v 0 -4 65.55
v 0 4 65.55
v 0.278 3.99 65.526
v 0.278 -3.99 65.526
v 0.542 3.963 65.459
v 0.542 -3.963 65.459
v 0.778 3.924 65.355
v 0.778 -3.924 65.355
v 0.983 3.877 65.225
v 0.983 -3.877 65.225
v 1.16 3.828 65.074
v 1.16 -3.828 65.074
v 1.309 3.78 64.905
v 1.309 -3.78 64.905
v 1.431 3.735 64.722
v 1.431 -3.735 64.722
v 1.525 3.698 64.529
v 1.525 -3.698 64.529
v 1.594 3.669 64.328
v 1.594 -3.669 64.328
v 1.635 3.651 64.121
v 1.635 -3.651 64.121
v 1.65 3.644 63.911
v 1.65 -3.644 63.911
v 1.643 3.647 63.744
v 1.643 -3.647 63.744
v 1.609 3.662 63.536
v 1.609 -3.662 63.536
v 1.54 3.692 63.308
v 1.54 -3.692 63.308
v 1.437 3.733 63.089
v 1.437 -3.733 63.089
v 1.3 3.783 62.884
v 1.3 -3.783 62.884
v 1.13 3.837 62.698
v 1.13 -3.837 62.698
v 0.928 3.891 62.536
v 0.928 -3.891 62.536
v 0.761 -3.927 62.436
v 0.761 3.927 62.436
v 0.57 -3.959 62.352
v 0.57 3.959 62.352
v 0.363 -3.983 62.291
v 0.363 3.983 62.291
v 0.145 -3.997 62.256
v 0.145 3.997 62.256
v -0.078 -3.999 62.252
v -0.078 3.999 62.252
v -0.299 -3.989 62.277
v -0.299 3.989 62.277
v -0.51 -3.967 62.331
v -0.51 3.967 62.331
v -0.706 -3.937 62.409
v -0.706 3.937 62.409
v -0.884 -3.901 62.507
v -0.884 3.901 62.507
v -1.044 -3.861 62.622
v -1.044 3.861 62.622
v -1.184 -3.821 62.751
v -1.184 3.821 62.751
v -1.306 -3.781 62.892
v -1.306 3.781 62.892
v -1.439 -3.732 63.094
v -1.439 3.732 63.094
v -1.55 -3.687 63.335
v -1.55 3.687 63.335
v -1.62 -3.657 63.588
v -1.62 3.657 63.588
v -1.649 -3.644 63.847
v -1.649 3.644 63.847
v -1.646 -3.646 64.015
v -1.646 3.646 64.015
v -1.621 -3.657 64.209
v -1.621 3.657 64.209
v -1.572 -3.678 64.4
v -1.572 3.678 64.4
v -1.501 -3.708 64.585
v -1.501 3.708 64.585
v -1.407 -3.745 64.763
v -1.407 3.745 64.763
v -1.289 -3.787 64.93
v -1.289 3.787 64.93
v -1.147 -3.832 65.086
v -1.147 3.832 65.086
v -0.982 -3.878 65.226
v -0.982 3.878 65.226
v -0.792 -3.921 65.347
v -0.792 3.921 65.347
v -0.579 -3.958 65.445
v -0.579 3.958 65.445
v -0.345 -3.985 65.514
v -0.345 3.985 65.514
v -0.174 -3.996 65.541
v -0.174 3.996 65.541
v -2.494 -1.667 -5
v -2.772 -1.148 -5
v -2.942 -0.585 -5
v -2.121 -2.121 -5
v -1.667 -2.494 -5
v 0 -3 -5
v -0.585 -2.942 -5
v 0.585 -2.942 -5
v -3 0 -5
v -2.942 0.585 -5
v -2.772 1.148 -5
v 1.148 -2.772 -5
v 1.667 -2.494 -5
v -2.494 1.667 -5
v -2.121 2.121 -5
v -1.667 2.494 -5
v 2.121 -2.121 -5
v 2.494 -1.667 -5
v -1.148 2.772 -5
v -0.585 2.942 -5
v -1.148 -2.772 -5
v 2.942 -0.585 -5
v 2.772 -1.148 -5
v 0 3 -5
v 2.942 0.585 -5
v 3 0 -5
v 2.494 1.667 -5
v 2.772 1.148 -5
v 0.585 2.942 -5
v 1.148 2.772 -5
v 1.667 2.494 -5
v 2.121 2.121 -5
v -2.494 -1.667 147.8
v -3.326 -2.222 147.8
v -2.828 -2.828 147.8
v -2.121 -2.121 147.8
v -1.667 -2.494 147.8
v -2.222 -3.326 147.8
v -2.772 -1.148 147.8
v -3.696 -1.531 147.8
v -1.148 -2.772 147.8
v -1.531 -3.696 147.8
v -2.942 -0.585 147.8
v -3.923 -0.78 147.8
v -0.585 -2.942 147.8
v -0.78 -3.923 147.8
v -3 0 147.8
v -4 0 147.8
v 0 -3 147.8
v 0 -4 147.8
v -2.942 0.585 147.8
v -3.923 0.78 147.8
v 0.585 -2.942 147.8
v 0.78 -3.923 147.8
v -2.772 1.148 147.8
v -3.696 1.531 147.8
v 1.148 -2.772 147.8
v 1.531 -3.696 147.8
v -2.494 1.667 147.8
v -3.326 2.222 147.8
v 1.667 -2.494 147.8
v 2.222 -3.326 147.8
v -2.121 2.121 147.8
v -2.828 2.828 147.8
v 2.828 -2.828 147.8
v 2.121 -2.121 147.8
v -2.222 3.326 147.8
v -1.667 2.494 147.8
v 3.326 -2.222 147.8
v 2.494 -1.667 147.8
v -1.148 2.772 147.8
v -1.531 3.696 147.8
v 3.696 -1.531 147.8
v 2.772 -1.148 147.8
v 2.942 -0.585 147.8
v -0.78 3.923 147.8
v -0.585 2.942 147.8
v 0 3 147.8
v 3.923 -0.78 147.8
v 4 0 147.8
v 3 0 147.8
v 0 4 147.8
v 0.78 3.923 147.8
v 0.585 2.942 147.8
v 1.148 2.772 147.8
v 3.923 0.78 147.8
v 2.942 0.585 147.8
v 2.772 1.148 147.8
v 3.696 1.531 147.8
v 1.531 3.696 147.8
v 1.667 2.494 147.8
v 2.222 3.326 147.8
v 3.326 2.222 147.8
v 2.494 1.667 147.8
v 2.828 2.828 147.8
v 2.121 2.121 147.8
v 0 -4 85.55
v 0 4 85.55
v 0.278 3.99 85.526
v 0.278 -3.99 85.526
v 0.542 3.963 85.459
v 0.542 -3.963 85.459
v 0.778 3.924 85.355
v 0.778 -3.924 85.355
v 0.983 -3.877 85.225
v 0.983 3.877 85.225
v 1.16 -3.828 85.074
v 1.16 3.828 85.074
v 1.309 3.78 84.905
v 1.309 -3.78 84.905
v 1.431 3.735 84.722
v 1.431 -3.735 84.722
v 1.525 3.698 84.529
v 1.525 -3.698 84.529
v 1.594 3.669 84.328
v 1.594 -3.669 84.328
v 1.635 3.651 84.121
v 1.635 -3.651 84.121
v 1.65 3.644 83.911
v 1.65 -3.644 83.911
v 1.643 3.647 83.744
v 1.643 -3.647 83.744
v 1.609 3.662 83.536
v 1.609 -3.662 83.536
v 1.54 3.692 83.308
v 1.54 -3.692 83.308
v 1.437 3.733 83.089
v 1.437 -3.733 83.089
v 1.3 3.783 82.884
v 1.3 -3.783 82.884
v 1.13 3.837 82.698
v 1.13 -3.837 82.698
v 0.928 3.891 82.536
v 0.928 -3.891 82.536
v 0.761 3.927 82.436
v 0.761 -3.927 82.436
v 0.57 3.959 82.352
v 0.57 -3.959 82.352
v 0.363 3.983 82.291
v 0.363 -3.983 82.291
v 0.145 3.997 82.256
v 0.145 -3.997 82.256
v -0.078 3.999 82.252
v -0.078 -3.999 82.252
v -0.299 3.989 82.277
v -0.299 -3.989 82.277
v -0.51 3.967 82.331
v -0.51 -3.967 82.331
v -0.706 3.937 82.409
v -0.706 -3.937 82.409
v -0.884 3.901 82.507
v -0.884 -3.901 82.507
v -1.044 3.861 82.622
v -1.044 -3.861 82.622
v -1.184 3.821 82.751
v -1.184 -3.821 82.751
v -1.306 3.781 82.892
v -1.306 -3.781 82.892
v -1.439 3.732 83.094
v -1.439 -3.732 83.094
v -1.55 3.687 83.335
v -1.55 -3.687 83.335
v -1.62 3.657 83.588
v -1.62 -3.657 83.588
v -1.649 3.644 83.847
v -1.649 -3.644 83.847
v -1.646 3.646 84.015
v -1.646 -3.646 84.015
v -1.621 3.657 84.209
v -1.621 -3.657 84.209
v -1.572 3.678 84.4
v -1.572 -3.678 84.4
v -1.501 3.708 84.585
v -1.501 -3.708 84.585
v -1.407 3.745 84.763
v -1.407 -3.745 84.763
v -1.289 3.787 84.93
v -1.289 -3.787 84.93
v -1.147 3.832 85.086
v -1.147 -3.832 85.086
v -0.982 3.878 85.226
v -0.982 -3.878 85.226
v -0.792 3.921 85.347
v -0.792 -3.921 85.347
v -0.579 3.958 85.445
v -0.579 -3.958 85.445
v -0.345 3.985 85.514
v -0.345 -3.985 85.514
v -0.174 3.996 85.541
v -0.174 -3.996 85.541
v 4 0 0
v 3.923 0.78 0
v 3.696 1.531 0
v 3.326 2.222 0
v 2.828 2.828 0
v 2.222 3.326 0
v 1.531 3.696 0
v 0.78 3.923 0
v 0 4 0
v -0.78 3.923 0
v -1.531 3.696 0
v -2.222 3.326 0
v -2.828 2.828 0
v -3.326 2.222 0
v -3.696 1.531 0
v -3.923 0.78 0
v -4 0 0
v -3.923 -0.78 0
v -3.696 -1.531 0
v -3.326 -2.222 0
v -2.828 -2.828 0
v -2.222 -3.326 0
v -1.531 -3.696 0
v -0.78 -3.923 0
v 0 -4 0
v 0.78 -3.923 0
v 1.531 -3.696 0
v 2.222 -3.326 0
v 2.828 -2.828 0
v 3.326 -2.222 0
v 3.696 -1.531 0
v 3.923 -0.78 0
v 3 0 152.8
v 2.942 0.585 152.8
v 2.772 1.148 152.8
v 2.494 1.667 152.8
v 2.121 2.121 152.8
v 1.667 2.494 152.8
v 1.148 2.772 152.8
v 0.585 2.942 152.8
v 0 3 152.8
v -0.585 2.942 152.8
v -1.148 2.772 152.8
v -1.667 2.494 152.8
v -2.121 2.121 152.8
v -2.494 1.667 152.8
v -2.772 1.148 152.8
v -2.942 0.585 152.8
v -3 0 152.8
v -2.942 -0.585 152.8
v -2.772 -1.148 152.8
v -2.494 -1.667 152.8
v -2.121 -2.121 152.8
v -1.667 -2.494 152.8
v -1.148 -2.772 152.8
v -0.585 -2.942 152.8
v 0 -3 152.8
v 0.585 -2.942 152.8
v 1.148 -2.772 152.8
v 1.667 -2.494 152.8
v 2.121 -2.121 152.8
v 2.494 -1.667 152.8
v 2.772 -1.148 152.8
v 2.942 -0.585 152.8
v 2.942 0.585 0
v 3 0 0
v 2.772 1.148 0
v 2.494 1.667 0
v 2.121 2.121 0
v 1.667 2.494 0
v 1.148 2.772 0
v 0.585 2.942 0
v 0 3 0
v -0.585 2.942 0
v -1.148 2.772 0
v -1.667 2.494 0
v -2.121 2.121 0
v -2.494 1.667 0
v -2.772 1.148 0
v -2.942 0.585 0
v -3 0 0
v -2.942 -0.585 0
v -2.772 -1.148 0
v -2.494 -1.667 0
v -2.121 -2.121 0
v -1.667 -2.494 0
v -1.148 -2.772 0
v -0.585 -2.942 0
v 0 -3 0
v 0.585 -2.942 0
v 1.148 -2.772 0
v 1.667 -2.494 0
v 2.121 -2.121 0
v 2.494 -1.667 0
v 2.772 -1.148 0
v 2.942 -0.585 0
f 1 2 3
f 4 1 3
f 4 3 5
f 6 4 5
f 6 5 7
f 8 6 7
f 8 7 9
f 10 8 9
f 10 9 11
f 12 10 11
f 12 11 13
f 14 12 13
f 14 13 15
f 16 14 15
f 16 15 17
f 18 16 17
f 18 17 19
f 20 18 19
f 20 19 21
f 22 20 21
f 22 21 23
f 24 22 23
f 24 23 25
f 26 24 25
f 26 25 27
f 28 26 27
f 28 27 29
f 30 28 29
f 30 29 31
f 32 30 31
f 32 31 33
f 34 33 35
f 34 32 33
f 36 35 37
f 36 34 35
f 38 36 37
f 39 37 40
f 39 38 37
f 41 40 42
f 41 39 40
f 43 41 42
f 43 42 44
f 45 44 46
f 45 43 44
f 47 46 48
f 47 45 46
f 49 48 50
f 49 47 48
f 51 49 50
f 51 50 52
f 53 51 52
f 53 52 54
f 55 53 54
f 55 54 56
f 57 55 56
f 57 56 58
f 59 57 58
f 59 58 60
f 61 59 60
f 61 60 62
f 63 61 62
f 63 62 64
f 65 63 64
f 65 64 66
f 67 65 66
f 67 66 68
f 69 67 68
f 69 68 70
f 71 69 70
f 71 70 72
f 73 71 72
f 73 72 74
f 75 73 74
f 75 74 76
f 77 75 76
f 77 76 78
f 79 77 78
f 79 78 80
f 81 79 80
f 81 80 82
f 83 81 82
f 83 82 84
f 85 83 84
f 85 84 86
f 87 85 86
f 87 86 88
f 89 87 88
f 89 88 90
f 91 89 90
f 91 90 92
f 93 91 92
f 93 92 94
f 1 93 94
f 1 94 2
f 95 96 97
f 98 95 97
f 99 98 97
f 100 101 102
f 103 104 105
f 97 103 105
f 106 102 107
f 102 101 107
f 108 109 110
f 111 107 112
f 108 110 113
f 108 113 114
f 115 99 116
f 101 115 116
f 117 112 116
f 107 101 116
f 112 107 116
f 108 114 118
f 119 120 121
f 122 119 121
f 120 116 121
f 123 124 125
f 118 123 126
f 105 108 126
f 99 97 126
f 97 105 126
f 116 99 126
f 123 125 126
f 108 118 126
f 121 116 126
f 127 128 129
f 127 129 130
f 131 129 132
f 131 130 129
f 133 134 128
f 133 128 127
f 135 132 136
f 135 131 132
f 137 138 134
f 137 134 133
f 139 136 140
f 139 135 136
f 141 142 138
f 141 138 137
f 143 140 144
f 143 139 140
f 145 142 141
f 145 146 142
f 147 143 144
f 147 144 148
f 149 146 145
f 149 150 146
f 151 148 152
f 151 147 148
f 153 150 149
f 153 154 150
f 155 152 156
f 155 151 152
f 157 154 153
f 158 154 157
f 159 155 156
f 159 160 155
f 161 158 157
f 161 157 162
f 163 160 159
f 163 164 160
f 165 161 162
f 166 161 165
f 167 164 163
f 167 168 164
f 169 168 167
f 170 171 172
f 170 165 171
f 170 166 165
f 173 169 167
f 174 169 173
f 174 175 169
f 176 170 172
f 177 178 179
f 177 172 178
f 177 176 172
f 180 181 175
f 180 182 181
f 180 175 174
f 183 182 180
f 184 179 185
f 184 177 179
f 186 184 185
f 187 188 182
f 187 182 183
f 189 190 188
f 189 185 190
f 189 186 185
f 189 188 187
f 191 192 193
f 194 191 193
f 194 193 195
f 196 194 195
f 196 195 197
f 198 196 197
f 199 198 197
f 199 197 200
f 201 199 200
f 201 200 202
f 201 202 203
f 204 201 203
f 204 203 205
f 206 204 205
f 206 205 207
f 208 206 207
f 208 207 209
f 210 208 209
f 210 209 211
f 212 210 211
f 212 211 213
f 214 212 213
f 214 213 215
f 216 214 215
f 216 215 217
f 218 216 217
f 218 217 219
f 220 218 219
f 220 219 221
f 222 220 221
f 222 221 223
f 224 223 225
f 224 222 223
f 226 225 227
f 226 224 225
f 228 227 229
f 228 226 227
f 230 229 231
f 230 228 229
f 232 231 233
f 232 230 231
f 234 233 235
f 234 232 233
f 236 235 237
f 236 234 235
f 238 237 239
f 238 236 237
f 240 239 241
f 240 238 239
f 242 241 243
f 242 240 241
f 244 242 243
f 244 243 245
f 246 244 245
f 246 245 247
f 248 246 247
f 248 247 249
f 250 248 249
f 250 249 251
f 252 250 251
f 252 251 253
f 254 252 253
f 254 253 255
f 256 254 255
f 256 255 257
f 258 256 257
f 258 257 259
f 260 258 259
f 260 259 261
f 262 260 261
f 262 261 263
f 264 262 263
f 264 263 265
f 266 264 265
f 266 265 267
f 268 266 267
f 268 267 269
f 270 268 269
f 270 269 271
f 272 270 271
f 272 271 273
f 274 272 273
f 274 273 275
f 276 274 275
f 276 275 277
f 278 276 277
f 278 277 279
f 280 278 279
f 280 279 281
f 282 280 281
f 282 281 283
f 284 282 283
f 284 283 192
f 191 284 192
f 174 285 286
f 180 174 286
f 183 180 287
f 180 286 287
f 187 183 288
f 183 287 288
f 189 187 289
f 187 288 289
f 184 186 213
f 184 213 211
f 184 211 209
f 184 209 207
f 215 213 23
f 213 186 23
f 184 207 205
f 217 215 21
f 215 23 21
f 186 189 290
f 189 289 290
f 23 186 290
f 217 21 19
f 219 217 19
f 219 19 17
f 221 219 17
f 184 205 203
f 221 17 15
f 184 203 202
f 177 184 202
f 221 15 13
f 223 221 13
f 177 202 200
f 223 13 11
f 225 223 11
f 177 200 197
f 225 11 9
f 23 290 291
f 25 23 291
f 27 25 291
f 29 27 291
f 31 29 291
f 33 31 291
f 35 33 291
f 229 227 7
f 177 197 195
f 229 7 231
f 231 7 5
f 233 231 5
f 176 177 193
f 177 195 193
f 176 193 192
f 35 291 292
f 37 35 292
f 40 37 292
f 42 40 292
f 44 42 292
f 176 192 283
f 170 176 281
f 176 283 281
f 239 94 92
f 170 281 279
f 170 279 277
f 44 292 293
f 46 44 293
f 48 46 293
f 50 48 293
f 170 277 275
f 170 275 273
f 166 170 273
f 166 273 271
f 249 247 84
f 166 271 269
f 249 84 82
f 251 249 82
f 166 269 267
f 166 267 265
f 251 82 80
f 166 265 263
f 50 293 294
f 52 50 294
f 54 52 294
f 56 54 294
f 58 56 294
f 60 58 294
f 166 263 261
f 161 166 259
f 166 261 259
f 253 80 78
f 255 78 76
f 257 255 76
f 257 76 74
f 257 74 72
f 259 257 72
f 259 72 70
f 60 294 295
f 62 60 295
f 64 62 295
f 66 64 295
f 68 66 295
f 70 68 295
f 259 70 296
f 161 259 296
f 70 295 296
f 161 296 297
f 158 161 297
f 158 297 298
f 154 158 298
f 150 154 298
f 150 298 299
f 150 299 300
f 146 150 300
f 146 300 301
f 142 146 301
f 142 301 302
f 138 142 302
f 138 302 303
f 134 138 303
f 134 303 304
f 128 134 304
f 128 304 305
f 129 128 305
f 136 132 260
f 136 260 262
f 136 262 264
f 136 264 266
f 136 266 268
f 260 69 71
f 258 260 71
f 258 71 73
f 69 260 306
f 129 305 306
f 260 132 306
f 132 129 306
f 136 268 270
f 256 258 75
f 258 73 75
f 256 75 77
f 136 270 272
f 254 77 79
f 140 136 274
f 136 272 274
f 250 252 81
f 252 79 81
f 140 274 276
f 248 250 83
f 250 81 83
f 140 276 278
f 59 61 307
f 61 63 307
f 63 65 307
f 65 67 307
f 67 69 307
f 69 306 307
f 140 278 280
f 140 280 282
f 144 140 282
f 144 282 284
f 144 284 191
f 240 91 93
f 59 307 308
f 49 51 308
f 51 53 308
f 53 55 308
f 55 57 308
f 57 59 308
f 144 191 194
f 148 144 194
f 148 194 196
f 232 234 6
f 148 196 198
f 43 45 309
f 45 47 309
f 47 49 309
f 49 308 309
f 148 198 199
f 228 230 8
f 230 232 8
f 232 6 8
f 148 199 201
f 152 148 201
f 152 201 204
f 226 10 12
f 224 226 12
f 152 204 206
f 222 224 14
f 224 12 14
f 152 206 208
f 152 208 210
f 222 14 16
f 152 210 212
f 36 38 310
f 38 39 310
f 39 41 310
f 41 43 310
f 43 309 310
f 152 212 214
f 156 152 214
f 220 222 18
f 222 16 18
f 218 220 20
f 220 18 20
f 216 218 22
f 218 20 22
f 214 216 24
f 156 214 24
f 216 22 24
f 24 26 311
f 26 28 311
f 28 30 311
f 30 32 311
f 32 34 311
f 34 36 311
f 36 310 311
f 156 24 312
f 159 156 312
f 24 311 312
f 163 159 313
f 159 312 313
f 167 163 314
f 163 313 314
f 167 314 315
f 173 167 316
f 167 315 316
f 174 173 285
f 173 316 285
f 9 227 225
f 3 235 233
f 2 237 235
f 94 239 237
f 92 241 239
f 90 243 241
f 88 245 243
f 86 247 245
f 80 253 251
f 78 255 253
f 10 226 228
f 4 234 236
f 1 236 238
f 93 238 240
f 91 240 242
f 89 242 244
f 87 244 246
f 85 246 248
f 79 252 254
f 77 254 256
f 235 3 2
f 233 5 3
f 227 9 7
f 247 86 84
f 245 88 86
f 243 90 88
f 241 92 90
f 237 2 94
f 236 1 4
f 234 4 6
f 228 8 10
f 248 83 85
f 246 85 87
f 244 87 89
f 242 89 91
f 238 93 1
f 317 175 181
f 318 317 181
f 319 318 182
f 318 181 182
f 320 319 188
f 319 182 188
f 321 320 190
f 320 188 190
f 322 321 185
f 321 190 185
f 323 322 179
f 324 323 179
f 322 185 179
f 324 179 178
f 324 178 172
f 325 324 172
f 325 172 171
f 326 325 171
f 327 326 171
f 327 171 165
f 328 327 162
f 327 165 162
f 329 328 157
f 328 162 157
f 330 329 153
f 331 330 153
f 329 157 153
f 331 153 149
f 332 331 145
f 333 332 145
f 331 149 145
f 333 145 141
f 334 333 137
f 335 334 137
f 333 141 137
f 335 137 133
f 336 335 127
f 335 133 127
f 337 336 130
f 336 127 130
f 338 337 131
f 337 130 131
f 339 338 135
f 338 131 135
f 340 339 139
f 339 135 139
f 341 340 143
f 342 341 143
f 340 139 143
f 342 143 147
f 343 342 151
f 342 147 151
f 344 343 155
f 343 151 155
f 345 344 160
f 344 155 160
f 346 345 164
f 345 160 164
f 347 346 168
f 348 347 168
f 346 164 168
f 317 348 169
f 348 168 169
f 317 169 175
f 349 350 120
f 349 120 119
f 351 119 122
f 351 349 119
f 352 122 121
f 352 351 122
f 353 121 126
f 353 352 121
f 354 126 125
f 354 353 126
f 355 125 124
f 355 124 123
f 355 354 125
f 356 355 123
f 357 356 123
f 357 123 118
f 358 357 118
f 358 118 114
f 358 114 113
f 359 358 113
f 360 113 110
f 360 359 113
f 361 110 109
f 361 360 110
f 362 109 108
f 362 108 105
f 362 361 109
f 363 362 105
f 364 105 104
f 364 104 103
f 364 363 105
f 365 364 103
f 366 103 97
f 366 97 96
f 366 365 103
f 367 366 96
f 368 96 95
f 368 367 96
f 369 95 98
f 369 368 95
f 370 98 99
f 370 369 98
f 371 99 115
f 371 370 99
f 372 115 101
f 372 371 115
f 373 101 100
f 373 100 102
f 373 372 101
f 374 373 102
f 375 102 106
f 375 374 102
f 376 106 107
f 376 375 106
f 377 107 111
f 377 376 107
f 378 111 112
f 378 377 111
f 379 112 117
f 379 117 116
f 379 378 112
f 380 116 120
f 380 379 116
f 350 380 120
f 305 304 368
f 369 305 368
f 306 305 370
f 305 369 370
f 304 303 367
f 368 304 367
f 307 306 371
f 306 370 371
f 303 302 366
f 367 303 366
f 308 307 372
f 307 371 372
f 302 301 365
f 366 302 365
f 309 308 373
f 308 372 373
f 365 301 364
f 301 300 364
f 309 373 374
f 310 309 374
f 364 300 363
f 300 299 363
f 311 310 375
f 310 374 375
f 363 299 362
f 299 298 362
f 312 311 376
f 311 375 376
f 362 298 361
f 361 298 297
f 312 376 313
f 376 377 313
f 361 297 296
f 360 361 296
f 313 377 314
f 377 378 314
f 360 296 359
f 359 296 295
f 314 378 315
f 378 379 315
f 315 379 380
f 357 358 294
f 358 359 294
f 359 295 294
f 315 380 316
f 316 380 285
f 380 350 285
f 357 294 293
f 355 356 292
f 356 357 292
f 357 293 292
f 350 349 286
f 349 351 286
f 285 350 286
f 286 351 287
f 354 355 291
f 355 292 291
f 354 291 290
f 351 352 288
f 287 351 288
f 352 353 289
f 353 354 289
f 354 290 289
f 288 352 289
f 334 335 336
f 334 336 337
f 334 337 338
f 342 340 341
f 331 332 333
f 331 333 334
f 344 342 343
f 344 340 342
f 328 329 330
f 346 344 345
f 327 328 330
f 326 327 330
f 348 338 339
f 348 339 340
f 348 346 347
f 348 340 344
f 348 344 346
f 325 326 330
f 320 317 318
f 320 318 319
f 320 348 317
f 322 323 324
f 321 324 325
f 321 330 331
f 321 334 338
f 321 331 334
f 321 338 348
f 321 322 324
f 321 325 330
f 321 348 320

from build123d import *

# Parameters (mm, degrees)
SKETCH_1_R               = 4
EXTRUDE_1_DEPTH          = 147.8
SKETCH_2_R               = 3
EXTRUDE_2_DEPTH          = 5
CUT_EXTRUDE_1_DEPTH      = 153.904676187
CUT_EXTRUDE_1_DEPTH_BACK = 153.904676187
SKETCH_3_R               = 1.65


with BuildPart() as part:
    # ｽｹｯﾁ1 → ﾎﾞｽ - 押し出し1 (new body)
    with BuildSketch(Plane.XY):
        Circle(SKETCH_1_R)
    extrude(amount=EXTRUDE_1_DEPTH)

    # ｽｹｯﾁ2 → ﾎﾞｽ - 押し出し2 (add)
    with BuildSketch(Plane.XY.offset(147.8)):
        Circle(SKETCH_2_R)
    extrude_2 = extrude(amount=EXTRUDE_2_DEPTH)

    # ﾐﾗｰ1: ﾎﾞｽ - 押し出し2 across plane
    add(extrude_2.mirror(Plane.XY.offset(73.9)))

    # ｽｹｯﾁ3 → ｶｯﾄ - 押し出し1 (cut, two sides: drawn at the far end of the back side and taken through both)
    with BuildSketch(Plane(origin=(0, 0, 0), x_dir=(1, 0, 0), z_dir=(0, 1, 0)).offset(-CUT_EXTRUDE_1_DEPTH_BACK)):
        with Locations(Location((0, -63.9, 0), (0, 0, 270))):
            Circle(SKETCH_3_R)
        with Locations(Location((0, -83.9, 0), (0, 0, 270))):
            Circle(SKETCH_3_R)
    extrude(amount=CUT_EXTRUDE_1_DEPTH + CUT_EXTRUDE_1_DEPTH_BACK, mode=Mode.SUBTRACT)


solid = part.part
